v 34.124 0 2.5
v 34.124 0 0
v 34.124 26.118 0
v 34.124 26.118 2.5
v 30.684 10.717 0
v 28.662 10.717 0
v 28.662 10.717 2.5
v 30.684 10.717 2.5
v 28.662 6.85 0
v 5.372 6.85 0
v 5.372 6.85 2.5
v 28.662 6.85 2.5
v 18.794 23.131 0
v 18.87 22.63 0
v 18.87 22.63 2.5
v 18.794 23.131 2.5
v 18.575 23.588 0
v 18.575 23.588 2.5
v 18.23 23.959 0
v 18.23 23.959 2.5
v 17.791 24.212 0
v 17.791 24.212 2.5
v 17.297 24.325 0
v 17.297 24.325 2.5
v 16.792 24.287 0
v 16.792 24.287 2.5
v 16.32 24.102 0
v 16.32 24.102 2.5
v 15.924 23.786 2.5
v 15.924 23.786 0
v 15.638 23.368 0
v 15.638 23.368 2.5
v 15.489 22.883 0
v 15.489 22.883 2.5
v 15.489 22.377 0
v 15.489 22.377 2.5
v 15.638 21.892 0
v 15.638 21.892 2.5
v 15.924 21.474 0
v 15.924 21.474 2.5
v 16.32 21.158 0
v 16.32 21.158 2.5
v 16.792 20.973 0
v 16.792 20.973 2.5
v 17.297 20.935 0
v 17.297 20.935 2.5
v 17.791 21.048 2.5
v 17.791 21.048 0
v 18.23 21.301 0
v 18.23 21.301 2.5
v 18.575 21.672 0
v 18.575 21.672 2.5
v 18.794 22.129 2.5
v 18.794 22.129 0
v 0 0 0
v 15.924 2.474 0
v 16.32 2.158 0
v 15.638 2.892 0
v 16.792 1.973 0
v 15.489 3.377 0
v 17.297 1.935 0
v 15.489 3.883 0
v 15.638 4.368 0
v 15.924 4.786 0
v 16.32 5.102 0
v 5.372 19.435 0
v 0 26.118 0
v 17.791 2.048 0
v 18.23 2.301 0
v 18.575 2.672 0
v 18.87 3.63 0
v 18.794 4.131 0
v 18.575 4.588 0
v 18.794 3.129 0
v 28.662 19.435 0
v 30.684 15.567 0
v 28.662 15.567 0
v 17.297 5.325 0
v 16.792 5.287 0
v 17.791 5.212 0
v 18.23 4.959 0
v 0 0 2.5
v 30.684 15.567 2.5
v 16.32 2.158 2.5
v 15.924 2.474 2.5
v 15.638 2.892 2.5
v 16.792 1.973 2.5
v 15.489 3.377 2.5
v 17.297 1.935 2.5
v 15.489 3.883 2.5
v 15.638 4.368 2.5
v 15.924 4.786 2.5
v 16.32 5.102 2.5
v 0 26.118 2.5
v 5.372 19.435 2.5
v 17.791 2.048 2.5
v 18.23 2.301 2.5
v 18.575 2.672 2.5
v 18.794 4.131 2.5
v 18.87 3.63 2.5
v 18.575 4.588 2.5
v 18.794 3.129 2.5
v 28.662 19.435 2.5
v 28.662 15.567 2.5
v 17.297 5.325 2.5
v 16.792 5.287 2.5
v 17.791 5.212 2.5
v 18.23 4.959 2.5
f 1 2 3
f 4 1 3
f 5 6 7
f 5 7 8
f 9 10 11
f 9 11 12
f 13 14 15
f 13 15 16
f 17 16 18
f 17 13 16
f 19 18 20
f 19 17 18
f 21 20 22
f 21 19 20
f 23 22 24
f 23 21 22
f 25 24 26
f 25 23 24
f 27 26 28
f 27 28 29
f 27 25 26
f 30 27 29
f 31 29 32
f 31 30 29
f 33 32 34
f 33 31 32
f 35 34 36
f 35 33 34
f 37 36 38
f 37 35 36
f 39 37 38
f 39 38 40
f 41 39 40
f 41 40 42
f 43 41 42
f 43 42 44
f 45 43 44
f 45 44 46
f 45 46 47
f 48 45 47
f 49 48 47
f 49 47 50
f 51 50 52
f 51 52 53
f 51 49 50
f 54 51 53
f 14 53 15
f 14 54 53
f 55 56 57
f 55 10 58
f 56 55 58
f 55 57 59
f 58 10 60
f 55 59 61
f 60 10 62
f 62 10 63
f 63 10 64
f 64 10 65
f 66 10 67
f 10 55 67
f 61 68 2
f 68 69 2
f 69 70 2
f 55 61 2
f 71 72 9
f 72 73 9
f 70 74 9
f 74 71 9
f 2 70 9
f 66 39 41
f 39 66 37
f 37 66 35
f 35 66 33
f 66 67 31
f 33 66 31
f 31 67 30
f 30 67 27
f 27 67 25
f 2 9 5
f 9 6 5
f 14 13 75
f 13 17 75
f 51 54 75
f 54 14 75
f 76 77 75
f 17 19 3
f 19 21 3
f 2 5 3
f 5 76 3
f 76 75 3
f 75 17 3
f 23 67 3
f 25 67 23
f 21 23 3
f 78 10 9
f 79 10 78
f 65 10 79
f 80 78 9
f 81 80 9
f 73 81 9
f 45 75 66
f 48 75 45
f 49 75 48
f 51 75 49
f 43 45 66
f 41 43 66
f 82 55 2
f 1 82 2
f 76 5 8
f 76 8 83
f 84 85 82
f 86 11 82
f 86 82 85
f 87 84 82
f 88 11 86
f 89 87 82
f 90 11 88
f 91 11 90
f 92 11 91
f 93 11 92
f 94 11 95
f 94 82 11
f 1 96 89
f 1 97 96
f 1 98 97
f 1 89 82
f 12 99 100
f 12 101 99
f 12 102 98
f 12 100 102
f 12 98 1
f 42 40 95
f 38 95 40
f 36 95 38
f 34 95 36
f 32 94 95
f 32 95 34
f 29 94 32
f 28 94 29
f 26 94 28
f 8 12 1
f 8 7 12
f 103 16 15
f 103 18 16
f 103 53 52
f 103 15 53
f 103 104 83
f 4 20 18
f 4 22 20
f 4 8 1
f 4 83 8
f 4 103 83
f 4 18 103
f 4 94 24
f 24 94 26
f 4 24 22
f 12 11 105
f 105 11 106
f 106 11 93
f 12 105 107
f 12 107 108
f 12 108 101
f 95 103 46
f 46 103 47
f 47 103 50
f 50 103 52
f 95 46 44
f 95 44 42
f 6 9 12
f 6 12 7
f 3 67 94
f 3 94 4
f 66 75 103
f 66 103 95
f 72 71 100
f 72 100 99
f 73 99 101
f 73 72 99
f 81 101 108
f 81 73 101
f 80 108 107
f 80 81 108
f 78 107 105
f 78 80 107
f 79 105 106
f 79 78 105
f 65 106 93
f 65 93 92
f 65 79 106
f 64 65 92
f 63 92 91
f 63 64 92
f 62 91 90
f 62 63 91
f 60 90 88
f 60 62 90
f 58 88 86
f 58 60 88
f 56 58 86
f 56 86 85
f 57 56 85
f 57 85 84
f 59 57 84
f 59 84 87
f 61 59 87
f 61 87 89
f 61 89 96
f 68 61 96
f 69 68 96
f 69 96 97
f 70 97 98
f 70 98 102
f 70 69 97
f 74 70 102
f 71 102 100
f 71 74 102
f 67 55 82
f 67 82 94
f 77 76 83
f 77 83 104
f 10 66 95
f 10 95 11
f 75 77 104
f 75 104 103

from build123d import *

# Parameters (mm, degrees)
SKETCH1_W           = 34.124427795
SKETCH1_H           = 26.117733668
SKETCH1_R           = 1.70000044
BOSS_EXTRUDE3_DEPTH = 2.5


with BuildPart() as part:
    # Sketch1 → Boss-Extrude3 (new body)
    with BuildSketch(Plane.XY):
        with Locations((17.062213898, 13.058866834)):
            Rectangle(SKETCH1_W, SKETCH1_H)
        with Locations((17.170001507, 3.630000591)):
            Circle(SKETCH1_R, mode=Mode.SUBTRACT)
        with Locations((17.170000399, 22.630012776)):
            Circle(SKETCH1_R, mode=Mode.SUBTRACT)
        Polygon((30.684032724, 15.567255888), (28.662081374, 15.567255888), (28.662081374, 19.434703738), (5.372492357, 19.434703738), (5.372492357, 6.850018518), (28.662081374, 6.850018518), (28.662081374, 10.717466368), (30.684032724, 10.717466368), align=None, mode=Mode.SUBTRACT)
    extrude(amount=BOSS_EXTRUDE3_DEPTH)


solid = part.part
